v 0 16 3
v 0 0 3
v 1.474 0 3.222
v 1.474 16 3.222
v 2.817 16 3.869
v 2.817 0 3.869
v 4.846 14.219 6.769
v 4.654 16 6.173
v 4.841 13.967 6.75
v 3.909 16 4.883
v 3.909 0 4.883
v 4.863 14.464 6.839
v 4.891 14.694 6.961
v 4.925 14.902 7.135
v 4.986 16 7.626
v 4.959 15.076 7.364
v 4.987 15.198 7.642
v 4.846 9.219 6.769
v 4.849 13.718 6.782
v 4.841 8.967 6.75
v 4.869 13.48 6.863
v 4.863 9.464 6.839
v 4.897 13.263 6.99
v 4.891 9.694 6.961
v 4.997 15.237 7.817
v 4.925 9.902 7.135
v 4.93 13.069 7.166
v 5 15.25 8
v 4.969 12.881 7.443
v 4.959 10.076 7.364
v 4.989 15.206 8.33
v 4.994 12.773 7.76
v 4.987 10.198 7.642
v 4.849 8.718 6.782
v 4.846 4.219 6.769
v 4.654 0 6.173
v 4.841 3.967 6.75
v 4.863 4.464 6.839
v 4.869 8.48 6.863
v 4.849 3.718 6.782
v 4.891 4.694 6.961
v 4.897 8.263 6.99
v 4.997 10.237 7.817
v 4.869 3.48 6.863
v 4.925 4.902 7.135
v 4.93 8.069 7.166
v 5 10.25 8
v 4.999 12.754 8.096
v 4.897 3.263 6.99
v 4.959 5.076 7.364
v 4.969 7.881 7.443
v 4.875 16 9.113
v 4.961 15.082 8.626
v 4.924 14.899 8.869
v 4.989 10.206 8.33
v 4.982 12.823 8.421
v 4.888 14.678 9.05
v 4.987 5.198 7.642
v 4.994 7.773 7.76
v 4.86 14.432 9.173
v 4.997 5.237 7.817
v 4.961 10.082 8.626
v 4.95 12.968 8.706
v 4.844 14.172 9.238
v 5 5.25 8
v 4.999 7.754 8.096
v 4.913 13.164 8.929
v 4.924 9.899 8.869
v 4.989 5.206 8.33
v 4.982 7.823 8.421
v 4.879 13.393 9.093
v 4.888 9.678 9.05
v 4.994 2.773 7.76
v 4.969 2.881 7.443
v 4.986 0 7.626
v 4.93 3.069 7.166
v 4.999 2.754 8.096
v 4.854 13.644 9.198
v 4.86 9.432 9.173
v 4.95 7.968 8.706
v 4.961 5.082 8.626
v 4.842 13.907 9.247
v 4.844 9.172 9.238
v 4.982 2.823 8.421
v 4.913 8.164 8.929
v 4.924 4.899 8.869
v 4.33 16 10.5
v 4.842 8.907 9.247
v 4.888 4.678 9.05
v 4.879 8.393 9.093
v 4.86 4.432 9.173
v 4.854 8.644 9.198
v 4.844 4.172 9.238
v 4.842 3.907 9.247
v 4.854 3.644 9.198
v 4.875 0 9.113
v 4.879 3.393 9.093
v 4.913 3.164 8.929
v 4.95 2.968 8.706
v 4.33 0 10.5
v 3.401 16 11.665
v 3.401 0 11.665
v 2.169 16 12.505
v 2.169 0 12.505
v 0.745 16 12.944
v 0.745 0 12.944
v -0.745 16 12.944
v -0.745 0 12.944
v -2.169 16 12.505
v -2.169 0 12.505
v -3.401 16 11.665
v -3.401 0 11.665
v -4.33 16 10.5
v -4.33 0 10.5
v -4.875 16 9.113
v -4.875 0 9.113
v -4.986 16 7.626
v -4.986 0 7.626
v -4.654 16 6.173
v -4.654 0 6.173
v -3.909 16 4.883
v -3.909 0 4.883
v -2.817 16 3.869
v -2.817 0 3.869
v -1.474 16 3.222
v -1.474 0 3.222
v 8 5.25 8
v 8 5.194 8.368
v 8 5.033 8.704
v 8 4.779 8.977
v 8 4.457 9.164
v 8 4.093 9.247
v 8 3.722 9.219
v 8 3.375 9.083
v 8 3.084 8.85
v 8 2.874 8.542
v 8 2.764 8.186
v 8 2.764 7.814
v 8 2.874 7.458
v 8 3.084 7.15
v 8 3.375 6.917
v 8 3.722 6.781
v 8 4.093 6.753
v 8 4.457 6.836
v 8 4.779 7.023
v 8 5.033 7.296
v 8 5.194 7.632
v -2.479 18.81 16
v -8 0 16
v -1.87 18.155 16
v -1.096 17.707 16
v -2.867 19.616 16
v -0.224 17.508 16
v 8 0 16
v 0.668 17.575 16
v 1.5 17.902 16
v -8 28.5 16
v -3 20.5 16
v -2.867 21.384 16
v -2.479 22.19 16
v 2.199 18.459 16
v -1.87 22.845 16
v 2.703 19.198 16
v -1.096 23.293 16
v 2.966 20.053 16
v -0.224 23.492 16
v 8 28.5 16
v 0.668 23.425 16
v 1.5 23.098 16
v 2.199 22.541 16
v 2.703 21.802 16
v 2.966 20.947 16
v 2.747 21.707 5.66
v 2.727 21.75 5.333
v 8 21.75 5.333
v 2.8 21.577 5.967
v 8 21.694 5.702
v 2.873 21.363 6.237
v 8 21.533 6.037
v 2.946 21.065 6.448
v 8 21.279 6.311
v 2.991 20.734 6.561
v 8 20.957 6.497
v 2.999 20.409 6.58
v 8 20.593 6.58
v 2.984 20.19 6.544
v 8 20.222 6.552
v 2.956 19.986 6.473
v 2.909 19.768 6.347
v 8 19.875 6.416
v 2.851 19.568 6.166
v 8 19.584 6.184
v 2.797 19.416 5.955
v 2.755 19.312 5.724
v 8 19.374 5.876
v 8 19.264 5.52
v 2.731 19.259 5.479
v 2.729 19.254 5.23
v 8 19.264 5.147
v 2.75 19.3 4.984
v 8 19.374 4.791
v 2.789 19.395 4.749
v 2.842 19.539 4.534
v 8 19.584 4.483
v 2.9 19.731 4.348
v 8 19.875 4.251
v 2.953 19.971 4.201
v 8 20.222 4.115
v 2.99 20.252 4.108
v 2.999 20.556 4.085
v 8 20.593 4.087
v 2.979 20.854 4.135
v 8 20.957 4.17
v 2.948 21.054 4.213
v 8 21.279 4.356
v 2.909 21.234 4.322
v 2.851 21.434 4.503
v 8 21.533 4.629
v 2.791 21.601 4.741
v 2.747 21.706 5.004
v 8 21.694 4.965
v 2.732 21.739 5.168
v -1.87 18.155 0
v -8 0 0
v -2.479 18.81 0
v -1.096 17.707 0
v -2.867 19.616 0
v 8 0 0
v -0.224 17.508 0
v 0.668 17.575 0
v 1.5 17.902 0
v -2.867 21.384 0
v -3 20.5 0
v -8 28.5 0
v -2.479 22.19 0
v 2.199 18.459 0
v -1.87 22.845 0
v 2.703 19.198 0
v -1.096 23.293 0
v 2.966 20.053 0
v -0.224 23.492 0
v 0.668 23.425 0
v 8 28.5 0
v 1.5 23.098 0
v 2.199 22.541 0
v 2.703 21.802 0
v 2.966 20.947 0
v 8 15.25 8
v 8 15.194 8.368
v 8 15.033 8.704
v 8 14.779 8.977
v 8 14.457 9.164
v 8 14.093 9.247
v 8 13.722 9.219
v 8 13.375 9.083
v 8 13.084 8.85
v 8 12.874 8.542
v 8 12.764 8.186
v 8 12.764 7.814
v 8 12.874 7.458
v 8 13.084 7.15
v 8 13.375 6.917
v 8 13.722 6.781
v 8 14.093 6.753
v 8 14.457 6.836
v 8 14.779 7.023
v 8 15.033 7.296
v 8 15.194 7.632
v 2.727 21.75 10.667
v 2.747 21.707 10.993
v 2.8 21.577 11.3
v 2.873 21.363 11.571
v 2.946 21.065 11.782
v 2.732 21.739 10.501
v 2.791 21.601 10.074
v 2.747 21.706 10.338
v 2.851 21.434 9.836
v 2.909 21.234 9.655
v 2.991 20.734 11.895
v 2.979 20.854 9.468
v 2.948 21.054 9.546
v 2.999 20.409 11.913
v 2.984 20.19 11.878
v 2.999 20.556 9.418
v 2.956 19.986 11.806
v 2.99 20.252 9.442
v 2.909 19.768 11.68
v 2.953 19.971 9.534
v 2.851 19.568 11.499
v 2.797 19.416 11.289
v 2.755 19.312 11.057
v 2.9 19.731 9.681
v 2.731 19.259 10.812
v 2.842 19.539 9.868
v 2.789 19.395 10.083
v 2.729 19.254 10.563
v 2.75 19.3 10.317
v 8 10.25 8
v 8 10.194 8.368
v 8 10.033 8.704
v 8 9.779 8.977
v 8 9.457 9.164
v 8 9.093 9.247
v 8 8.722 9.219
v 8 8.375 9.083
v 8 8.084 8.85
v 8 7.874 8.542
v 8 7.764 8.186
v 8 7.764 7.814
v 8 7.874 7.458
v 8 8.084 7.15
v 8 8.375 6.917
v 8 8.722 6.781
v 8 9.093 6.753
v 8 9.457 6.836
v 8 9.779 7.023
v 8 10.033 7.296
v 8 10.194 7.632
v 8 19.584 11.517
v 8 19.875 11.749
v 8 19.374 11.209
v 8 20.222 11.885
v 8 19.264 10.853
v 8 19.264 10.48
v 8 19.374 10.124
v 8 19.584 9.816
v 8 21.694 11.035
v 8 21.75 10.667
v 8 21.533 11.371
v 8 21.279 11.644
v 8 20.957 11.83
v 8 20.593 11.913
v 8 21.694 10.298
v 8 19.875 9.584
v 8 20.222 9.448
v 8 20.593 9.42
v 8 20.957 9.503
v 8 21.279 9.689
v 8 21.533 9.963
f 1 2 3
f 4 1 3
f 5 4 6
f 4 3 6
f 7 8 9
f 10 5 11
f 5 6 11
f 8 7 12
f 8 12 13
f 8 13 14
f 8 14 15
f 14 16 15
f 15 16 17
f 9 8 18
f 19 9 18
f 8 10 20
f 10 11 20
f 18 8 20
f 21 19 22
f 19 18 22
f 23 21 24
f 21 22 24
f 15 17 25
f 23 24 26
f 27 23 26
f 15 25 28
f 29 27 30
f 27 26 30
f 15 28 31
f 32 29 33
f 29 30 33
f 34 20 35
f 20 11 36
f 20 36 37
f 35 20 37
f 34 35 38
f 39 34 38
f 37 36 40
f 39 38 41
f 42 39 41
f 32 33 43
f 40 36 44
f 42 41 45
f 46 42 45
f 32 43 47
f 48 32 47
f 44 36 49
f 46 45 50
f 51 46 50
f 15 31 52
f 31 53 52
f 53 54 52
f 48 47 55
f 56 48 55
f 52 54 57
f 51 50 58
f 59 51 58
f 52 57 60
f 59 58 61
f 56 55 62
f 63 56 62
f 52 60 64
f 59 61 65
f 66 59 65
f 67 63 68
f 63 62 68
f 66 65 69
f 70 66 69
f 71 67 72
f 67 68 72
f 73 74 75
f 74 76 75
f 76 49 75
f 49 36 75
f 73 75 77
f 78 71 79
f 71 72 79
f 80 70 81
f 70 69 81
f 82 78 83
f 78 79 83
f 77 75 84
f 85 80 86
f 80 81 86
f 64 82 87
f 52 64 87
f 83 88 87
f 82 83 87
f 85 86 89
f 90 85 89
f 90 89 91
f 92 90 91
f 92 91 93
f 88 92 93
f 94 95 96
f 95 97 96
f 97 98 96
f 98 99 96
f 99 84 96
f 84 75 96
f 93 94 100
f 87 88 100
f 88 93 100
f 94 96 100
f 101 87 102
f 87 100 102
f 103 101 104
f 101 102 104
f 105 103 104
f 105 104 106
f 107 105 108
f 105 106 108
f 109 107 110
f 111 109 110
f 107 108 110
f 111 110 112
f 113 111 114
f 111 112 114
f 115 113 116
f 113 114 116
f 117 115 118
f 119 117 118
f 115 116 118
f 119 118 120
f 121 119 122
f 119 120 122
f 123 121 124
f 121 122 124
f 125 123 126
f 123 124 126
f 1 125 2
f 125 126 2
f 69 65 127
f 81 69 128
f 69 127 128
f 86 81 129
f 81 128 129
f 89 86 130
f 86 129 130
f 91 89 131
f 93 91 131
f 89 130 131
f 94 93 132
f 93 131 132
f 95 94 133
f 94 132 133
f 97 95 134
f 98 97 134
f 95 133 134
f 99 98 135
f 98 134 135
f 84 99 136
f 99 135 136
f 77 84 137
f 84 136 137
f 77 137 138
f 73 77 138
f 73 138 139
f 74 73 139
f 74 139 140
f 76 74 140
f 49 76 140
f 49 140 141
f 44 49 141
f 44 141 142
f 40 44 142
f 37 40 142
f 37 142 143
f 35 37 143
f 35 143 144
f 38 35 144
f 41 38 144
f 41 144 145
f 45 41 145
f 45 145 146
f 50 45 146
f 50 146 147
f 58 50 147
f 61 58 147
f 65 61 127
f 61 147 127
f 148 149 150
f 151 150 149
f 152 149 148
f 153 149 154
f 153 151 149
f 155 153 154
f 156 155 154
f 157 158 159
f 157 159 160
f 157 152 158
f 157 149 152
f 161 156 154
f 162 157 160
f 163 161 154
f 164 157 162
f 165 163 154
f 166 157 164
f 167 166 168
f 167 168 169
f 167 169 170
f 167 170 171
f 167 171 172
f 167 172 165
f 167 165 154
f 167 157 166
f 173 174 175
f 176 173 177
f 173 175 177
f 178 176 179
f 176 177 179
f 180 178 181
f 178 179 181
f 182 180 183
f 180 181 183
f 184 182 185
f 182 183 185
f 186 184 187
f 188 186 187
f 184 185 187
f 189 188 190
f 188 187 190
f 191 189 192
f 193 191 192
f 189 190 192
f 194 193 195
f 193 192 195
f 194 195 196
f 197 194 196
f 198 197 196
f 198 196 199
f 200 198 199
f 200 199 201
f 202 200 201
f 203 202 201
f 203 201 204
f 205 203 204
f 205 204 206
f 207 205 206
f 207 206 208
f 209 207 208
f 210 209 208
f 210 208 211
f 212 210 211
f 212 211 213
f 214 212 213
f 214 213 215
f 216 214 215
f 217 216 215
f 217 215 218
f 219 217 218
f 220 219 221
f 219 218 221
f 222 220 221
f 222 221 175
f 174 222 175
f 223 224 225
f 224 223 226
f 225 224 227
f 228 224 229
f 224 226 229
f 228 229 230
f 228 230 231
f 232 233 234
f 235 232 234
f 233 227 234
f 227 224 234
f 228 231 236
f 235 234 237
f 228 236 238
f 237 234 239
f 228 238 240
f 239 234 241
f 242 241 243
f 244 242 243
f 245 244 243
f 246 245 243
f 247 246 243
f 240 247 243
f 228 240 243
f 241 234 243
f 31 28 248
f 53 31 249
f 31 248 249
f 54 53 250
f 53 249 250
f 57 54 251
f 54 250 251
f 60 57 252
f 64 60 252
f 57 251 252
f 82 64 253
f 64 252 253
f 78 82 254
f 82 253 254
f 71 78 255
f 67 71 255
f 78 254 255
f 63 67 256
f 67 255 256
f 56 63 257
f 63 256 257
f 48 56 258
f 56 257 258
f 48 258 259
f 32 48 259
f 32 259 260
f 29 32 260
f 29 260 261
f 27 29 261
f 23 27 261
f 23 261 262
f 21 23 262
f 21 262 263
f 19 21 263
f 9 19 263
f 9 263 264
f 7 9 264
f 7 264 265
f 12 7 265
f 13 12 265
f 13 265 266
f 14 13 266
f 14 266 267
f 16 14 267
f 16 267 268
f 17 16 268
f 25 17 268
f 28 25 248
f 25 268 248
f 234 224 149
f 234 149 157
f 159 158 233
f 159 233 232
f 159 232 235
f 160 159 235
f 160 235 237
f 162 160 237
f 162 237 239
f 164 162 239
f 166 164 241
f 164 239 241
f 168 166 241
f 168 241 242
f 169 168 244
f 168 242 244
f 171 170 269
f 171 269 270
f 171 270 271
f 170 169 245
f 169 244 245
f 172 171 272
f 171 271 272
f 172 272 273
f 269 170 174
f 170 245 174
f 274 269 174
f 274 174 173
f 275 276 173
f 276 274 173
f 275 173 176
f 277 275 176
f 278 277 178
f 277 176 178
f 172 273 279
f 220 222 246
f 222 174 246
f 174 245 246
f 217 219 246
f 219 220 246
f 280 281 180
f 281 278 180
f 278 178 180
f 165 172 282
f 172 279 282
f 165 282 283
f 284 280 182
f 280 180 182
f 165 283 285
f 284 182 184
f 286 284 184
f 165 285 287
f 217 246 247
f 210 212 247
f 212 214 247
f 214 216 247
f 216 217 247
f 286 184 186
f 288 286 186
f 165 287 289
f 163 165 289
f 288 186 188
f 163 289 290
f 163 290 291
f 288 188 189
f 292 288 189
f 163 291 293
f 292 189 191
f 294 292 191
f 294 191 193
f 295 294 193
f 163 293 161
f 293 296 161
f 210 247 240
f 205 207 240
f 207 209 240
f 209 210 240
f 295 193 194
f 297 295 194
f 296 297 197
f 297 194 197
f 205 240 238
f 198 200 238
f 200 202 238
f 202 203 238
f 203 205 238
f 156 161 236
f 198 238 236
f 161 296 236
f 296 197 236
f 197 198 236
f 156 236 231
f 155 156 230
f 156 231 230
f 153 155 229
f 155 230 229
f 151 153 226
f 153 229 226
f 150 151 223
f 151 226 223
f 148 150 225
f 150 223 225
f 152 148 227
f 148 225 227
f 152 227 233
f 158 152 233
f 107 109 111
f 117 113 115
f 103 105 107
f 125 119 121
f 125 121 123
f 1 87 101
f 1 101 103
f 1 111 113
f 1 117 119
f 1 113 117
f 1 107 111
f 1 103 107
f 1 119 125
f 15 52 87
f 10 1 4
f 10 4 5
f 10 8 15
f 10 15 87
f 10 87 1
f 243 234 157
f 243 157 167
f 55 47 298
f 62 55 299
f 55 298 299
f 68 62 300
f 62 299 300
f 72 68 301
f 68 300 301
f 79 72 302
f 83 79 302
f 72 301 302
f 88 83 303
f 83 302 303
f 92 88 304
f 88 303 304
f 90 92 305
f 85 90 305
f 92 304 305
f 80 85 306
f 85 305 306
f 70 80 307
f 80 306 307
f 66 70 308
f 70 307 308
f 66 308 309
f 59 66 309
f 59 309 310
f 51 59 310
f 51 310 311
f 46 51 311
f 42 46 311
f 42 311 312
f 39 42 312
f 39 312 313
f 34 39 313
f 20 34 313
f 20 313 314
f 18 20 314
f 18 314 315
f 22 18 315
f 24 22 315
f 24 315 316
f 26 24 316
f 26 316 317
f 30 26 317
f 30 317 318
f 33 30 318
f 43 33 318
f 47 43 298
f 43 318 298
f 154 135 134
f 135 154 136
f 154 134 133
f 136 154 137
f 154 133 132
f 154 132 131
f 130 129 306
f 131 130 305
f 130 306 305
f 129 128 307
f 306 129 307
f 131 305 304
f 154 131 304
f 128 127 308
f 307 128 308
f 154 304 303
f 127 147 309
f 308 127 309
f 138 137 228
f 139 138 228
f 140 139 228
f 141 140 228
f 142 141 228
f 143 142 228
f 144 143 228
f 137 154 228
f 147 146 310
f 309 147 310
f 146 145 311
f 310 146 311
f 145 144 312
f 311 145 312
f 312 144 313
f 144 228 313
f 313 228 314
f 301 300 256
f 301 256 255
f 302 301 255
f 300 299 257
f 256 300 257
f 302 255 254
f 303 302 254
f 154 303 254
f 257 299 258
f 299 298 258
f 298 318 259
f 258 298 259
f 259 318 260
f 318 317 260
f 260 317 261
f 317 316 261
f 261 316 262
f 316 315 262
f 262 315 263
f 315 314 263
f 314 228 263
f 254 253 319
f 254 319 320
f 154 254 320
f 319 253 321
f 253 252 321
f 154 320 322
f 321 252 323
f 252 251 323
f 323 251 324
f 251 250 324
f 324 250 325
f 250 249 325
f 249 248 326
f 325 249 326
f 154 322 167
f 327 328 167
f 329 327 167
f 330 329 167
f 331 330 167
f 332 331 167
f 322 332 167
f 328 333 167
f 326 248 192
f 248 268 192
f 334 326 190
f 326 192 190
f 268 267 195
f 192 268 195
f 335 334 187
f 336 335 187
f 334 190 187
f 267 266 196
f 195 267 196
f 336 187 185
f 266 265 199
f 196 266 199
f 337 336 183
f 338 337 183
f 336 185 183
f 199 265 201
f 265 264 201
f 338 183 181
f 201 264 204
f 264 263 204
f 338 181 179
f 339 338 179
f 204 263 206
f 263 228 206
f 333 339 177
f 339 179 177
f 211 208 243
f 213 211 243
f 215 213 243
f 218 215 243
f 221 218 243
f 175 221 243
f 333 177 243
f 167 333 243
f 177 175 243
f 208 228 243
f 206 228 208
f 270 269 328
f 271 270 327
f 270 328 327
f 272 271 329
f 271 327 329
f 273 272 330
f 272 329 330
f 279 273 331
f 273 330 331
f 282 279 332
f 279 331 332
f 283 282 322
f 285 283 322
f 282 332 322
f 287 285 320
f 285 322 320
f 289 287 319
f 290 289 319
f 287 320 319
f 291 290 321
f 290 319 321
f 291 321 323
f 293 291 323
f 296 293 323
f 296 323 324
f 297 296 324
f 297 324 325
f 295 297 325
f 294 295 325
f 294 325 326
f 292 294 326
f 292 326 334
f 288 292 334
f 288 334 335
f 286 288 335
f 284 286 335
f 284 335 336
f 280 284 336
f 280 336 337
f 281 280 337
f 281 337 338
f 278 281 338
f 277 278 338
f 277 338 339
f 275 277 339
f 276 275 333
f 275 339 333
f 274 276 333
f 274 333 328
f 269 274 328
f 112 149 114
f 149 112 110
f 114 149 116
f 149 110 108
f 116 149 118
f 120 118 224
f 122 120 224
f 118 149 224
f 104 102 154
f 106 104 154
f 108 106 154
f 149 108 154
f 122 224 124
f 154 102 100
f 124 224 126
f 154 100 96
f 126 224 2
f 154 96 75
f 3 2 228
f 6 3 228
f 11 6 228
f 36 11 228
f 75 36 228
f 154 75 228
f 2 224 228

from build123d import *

# Parameters (mm, degrees)
SKETCH1_W           = 16
SKETCH1_H           = 28.5
BOSS_EXTRUDE1_DEPTH = 16
SKETCH2_R           = 5
CUT_EXTRUDE1_DEPTH  = 16
SKETCH3_R           = 3
CUT_EXTRUDE2_DEPTH  = 34.648922717
SKETCH4_R           = 1.25
CUT_EXTRUDE3_DEPTH  = 10
SKETCH6_R           = 1.25
CUT_EXTRUDE4_DEPTH  = 8


with BuildPart() as part:
    # Sketch1 → Boss-Extrude1 (new body)
    with BuildSketch(Plane.XY):
        with Locations((0, 14.25)):
            Rectangle(SKETCH1_W, SKETCH1_H)
    extrude(amount=BOSS_EXTRUDE1_DEPTH)

    # Sketch2 → Cut-Extrude1 (cut)
    with BuildSketch(Plane(origin=(0, 0, 0), x_dir=(-1, 0, 0), z_dir=(0, -1, 0))):
        with Locations(Location((0, -8, 0), (0, 0, 90))):
            Circle(SKETCH2_R)
    extrude(amount=-CUT_EXTRUDE1_DEPTH, mode=Mode.SUBTRACT)

    # Sketch3 → Cut-Extrude2 (cut, through all)
    with BuildSketch(Plane(origin=(0, 0, 0), x_dir=(-1, 0, 0), z_dir=(0, 0, -1))):
        with Locations((0, 20.5)):
            Circle(SKETCH3_R)
    extrude(amount=-CUT_EXTRUDE2_DEPTH, mode=Mode.SUBTRACT)

    # Sketch4 → Cut-Extrude3 (cut)
    with BuildSketch(Plane(origin=(8, 0, 0), x_dir=(0, 0, -1), z_dir=(1, 0, 0))):
        with Locations(Location((-10.666666667, 20.5, 0), (0, 0, 90))):
            Circle(SKETCH4_R)
        with Locations(Location((-5.333333333, 20.5, 0), (0, 0, 90))):
            Circle(SKETCH4_R)
    extrude(amount=-CUT_EXTRUDE3_DEPTH, mode=Mode.SUBTRACT)

    # Sketch6 → Cut-Extrude4 (cut)
    with BuildSketch(Plane(origin=(8, 0, 0), x_dir=(0, 0, -1), z_dir=(1, 0, 0))):
        with Locations(Location((-8, 14, 0), (0, 0, 90))):
            Circle(SKETCH6_R)
        with Locations(Location((-8, 9, 0), (0, 0, 90))):
            Circle(SKETCH6_R)
        with Locations(Location((-8, 4, 0), (0, 0, 90))):
            Circle(SKETCH6_R)
    extrude(amount=-CUT_EXTRUDE4_DEPTH, mode=Mode.SUBTRACT)


solid = part.part
